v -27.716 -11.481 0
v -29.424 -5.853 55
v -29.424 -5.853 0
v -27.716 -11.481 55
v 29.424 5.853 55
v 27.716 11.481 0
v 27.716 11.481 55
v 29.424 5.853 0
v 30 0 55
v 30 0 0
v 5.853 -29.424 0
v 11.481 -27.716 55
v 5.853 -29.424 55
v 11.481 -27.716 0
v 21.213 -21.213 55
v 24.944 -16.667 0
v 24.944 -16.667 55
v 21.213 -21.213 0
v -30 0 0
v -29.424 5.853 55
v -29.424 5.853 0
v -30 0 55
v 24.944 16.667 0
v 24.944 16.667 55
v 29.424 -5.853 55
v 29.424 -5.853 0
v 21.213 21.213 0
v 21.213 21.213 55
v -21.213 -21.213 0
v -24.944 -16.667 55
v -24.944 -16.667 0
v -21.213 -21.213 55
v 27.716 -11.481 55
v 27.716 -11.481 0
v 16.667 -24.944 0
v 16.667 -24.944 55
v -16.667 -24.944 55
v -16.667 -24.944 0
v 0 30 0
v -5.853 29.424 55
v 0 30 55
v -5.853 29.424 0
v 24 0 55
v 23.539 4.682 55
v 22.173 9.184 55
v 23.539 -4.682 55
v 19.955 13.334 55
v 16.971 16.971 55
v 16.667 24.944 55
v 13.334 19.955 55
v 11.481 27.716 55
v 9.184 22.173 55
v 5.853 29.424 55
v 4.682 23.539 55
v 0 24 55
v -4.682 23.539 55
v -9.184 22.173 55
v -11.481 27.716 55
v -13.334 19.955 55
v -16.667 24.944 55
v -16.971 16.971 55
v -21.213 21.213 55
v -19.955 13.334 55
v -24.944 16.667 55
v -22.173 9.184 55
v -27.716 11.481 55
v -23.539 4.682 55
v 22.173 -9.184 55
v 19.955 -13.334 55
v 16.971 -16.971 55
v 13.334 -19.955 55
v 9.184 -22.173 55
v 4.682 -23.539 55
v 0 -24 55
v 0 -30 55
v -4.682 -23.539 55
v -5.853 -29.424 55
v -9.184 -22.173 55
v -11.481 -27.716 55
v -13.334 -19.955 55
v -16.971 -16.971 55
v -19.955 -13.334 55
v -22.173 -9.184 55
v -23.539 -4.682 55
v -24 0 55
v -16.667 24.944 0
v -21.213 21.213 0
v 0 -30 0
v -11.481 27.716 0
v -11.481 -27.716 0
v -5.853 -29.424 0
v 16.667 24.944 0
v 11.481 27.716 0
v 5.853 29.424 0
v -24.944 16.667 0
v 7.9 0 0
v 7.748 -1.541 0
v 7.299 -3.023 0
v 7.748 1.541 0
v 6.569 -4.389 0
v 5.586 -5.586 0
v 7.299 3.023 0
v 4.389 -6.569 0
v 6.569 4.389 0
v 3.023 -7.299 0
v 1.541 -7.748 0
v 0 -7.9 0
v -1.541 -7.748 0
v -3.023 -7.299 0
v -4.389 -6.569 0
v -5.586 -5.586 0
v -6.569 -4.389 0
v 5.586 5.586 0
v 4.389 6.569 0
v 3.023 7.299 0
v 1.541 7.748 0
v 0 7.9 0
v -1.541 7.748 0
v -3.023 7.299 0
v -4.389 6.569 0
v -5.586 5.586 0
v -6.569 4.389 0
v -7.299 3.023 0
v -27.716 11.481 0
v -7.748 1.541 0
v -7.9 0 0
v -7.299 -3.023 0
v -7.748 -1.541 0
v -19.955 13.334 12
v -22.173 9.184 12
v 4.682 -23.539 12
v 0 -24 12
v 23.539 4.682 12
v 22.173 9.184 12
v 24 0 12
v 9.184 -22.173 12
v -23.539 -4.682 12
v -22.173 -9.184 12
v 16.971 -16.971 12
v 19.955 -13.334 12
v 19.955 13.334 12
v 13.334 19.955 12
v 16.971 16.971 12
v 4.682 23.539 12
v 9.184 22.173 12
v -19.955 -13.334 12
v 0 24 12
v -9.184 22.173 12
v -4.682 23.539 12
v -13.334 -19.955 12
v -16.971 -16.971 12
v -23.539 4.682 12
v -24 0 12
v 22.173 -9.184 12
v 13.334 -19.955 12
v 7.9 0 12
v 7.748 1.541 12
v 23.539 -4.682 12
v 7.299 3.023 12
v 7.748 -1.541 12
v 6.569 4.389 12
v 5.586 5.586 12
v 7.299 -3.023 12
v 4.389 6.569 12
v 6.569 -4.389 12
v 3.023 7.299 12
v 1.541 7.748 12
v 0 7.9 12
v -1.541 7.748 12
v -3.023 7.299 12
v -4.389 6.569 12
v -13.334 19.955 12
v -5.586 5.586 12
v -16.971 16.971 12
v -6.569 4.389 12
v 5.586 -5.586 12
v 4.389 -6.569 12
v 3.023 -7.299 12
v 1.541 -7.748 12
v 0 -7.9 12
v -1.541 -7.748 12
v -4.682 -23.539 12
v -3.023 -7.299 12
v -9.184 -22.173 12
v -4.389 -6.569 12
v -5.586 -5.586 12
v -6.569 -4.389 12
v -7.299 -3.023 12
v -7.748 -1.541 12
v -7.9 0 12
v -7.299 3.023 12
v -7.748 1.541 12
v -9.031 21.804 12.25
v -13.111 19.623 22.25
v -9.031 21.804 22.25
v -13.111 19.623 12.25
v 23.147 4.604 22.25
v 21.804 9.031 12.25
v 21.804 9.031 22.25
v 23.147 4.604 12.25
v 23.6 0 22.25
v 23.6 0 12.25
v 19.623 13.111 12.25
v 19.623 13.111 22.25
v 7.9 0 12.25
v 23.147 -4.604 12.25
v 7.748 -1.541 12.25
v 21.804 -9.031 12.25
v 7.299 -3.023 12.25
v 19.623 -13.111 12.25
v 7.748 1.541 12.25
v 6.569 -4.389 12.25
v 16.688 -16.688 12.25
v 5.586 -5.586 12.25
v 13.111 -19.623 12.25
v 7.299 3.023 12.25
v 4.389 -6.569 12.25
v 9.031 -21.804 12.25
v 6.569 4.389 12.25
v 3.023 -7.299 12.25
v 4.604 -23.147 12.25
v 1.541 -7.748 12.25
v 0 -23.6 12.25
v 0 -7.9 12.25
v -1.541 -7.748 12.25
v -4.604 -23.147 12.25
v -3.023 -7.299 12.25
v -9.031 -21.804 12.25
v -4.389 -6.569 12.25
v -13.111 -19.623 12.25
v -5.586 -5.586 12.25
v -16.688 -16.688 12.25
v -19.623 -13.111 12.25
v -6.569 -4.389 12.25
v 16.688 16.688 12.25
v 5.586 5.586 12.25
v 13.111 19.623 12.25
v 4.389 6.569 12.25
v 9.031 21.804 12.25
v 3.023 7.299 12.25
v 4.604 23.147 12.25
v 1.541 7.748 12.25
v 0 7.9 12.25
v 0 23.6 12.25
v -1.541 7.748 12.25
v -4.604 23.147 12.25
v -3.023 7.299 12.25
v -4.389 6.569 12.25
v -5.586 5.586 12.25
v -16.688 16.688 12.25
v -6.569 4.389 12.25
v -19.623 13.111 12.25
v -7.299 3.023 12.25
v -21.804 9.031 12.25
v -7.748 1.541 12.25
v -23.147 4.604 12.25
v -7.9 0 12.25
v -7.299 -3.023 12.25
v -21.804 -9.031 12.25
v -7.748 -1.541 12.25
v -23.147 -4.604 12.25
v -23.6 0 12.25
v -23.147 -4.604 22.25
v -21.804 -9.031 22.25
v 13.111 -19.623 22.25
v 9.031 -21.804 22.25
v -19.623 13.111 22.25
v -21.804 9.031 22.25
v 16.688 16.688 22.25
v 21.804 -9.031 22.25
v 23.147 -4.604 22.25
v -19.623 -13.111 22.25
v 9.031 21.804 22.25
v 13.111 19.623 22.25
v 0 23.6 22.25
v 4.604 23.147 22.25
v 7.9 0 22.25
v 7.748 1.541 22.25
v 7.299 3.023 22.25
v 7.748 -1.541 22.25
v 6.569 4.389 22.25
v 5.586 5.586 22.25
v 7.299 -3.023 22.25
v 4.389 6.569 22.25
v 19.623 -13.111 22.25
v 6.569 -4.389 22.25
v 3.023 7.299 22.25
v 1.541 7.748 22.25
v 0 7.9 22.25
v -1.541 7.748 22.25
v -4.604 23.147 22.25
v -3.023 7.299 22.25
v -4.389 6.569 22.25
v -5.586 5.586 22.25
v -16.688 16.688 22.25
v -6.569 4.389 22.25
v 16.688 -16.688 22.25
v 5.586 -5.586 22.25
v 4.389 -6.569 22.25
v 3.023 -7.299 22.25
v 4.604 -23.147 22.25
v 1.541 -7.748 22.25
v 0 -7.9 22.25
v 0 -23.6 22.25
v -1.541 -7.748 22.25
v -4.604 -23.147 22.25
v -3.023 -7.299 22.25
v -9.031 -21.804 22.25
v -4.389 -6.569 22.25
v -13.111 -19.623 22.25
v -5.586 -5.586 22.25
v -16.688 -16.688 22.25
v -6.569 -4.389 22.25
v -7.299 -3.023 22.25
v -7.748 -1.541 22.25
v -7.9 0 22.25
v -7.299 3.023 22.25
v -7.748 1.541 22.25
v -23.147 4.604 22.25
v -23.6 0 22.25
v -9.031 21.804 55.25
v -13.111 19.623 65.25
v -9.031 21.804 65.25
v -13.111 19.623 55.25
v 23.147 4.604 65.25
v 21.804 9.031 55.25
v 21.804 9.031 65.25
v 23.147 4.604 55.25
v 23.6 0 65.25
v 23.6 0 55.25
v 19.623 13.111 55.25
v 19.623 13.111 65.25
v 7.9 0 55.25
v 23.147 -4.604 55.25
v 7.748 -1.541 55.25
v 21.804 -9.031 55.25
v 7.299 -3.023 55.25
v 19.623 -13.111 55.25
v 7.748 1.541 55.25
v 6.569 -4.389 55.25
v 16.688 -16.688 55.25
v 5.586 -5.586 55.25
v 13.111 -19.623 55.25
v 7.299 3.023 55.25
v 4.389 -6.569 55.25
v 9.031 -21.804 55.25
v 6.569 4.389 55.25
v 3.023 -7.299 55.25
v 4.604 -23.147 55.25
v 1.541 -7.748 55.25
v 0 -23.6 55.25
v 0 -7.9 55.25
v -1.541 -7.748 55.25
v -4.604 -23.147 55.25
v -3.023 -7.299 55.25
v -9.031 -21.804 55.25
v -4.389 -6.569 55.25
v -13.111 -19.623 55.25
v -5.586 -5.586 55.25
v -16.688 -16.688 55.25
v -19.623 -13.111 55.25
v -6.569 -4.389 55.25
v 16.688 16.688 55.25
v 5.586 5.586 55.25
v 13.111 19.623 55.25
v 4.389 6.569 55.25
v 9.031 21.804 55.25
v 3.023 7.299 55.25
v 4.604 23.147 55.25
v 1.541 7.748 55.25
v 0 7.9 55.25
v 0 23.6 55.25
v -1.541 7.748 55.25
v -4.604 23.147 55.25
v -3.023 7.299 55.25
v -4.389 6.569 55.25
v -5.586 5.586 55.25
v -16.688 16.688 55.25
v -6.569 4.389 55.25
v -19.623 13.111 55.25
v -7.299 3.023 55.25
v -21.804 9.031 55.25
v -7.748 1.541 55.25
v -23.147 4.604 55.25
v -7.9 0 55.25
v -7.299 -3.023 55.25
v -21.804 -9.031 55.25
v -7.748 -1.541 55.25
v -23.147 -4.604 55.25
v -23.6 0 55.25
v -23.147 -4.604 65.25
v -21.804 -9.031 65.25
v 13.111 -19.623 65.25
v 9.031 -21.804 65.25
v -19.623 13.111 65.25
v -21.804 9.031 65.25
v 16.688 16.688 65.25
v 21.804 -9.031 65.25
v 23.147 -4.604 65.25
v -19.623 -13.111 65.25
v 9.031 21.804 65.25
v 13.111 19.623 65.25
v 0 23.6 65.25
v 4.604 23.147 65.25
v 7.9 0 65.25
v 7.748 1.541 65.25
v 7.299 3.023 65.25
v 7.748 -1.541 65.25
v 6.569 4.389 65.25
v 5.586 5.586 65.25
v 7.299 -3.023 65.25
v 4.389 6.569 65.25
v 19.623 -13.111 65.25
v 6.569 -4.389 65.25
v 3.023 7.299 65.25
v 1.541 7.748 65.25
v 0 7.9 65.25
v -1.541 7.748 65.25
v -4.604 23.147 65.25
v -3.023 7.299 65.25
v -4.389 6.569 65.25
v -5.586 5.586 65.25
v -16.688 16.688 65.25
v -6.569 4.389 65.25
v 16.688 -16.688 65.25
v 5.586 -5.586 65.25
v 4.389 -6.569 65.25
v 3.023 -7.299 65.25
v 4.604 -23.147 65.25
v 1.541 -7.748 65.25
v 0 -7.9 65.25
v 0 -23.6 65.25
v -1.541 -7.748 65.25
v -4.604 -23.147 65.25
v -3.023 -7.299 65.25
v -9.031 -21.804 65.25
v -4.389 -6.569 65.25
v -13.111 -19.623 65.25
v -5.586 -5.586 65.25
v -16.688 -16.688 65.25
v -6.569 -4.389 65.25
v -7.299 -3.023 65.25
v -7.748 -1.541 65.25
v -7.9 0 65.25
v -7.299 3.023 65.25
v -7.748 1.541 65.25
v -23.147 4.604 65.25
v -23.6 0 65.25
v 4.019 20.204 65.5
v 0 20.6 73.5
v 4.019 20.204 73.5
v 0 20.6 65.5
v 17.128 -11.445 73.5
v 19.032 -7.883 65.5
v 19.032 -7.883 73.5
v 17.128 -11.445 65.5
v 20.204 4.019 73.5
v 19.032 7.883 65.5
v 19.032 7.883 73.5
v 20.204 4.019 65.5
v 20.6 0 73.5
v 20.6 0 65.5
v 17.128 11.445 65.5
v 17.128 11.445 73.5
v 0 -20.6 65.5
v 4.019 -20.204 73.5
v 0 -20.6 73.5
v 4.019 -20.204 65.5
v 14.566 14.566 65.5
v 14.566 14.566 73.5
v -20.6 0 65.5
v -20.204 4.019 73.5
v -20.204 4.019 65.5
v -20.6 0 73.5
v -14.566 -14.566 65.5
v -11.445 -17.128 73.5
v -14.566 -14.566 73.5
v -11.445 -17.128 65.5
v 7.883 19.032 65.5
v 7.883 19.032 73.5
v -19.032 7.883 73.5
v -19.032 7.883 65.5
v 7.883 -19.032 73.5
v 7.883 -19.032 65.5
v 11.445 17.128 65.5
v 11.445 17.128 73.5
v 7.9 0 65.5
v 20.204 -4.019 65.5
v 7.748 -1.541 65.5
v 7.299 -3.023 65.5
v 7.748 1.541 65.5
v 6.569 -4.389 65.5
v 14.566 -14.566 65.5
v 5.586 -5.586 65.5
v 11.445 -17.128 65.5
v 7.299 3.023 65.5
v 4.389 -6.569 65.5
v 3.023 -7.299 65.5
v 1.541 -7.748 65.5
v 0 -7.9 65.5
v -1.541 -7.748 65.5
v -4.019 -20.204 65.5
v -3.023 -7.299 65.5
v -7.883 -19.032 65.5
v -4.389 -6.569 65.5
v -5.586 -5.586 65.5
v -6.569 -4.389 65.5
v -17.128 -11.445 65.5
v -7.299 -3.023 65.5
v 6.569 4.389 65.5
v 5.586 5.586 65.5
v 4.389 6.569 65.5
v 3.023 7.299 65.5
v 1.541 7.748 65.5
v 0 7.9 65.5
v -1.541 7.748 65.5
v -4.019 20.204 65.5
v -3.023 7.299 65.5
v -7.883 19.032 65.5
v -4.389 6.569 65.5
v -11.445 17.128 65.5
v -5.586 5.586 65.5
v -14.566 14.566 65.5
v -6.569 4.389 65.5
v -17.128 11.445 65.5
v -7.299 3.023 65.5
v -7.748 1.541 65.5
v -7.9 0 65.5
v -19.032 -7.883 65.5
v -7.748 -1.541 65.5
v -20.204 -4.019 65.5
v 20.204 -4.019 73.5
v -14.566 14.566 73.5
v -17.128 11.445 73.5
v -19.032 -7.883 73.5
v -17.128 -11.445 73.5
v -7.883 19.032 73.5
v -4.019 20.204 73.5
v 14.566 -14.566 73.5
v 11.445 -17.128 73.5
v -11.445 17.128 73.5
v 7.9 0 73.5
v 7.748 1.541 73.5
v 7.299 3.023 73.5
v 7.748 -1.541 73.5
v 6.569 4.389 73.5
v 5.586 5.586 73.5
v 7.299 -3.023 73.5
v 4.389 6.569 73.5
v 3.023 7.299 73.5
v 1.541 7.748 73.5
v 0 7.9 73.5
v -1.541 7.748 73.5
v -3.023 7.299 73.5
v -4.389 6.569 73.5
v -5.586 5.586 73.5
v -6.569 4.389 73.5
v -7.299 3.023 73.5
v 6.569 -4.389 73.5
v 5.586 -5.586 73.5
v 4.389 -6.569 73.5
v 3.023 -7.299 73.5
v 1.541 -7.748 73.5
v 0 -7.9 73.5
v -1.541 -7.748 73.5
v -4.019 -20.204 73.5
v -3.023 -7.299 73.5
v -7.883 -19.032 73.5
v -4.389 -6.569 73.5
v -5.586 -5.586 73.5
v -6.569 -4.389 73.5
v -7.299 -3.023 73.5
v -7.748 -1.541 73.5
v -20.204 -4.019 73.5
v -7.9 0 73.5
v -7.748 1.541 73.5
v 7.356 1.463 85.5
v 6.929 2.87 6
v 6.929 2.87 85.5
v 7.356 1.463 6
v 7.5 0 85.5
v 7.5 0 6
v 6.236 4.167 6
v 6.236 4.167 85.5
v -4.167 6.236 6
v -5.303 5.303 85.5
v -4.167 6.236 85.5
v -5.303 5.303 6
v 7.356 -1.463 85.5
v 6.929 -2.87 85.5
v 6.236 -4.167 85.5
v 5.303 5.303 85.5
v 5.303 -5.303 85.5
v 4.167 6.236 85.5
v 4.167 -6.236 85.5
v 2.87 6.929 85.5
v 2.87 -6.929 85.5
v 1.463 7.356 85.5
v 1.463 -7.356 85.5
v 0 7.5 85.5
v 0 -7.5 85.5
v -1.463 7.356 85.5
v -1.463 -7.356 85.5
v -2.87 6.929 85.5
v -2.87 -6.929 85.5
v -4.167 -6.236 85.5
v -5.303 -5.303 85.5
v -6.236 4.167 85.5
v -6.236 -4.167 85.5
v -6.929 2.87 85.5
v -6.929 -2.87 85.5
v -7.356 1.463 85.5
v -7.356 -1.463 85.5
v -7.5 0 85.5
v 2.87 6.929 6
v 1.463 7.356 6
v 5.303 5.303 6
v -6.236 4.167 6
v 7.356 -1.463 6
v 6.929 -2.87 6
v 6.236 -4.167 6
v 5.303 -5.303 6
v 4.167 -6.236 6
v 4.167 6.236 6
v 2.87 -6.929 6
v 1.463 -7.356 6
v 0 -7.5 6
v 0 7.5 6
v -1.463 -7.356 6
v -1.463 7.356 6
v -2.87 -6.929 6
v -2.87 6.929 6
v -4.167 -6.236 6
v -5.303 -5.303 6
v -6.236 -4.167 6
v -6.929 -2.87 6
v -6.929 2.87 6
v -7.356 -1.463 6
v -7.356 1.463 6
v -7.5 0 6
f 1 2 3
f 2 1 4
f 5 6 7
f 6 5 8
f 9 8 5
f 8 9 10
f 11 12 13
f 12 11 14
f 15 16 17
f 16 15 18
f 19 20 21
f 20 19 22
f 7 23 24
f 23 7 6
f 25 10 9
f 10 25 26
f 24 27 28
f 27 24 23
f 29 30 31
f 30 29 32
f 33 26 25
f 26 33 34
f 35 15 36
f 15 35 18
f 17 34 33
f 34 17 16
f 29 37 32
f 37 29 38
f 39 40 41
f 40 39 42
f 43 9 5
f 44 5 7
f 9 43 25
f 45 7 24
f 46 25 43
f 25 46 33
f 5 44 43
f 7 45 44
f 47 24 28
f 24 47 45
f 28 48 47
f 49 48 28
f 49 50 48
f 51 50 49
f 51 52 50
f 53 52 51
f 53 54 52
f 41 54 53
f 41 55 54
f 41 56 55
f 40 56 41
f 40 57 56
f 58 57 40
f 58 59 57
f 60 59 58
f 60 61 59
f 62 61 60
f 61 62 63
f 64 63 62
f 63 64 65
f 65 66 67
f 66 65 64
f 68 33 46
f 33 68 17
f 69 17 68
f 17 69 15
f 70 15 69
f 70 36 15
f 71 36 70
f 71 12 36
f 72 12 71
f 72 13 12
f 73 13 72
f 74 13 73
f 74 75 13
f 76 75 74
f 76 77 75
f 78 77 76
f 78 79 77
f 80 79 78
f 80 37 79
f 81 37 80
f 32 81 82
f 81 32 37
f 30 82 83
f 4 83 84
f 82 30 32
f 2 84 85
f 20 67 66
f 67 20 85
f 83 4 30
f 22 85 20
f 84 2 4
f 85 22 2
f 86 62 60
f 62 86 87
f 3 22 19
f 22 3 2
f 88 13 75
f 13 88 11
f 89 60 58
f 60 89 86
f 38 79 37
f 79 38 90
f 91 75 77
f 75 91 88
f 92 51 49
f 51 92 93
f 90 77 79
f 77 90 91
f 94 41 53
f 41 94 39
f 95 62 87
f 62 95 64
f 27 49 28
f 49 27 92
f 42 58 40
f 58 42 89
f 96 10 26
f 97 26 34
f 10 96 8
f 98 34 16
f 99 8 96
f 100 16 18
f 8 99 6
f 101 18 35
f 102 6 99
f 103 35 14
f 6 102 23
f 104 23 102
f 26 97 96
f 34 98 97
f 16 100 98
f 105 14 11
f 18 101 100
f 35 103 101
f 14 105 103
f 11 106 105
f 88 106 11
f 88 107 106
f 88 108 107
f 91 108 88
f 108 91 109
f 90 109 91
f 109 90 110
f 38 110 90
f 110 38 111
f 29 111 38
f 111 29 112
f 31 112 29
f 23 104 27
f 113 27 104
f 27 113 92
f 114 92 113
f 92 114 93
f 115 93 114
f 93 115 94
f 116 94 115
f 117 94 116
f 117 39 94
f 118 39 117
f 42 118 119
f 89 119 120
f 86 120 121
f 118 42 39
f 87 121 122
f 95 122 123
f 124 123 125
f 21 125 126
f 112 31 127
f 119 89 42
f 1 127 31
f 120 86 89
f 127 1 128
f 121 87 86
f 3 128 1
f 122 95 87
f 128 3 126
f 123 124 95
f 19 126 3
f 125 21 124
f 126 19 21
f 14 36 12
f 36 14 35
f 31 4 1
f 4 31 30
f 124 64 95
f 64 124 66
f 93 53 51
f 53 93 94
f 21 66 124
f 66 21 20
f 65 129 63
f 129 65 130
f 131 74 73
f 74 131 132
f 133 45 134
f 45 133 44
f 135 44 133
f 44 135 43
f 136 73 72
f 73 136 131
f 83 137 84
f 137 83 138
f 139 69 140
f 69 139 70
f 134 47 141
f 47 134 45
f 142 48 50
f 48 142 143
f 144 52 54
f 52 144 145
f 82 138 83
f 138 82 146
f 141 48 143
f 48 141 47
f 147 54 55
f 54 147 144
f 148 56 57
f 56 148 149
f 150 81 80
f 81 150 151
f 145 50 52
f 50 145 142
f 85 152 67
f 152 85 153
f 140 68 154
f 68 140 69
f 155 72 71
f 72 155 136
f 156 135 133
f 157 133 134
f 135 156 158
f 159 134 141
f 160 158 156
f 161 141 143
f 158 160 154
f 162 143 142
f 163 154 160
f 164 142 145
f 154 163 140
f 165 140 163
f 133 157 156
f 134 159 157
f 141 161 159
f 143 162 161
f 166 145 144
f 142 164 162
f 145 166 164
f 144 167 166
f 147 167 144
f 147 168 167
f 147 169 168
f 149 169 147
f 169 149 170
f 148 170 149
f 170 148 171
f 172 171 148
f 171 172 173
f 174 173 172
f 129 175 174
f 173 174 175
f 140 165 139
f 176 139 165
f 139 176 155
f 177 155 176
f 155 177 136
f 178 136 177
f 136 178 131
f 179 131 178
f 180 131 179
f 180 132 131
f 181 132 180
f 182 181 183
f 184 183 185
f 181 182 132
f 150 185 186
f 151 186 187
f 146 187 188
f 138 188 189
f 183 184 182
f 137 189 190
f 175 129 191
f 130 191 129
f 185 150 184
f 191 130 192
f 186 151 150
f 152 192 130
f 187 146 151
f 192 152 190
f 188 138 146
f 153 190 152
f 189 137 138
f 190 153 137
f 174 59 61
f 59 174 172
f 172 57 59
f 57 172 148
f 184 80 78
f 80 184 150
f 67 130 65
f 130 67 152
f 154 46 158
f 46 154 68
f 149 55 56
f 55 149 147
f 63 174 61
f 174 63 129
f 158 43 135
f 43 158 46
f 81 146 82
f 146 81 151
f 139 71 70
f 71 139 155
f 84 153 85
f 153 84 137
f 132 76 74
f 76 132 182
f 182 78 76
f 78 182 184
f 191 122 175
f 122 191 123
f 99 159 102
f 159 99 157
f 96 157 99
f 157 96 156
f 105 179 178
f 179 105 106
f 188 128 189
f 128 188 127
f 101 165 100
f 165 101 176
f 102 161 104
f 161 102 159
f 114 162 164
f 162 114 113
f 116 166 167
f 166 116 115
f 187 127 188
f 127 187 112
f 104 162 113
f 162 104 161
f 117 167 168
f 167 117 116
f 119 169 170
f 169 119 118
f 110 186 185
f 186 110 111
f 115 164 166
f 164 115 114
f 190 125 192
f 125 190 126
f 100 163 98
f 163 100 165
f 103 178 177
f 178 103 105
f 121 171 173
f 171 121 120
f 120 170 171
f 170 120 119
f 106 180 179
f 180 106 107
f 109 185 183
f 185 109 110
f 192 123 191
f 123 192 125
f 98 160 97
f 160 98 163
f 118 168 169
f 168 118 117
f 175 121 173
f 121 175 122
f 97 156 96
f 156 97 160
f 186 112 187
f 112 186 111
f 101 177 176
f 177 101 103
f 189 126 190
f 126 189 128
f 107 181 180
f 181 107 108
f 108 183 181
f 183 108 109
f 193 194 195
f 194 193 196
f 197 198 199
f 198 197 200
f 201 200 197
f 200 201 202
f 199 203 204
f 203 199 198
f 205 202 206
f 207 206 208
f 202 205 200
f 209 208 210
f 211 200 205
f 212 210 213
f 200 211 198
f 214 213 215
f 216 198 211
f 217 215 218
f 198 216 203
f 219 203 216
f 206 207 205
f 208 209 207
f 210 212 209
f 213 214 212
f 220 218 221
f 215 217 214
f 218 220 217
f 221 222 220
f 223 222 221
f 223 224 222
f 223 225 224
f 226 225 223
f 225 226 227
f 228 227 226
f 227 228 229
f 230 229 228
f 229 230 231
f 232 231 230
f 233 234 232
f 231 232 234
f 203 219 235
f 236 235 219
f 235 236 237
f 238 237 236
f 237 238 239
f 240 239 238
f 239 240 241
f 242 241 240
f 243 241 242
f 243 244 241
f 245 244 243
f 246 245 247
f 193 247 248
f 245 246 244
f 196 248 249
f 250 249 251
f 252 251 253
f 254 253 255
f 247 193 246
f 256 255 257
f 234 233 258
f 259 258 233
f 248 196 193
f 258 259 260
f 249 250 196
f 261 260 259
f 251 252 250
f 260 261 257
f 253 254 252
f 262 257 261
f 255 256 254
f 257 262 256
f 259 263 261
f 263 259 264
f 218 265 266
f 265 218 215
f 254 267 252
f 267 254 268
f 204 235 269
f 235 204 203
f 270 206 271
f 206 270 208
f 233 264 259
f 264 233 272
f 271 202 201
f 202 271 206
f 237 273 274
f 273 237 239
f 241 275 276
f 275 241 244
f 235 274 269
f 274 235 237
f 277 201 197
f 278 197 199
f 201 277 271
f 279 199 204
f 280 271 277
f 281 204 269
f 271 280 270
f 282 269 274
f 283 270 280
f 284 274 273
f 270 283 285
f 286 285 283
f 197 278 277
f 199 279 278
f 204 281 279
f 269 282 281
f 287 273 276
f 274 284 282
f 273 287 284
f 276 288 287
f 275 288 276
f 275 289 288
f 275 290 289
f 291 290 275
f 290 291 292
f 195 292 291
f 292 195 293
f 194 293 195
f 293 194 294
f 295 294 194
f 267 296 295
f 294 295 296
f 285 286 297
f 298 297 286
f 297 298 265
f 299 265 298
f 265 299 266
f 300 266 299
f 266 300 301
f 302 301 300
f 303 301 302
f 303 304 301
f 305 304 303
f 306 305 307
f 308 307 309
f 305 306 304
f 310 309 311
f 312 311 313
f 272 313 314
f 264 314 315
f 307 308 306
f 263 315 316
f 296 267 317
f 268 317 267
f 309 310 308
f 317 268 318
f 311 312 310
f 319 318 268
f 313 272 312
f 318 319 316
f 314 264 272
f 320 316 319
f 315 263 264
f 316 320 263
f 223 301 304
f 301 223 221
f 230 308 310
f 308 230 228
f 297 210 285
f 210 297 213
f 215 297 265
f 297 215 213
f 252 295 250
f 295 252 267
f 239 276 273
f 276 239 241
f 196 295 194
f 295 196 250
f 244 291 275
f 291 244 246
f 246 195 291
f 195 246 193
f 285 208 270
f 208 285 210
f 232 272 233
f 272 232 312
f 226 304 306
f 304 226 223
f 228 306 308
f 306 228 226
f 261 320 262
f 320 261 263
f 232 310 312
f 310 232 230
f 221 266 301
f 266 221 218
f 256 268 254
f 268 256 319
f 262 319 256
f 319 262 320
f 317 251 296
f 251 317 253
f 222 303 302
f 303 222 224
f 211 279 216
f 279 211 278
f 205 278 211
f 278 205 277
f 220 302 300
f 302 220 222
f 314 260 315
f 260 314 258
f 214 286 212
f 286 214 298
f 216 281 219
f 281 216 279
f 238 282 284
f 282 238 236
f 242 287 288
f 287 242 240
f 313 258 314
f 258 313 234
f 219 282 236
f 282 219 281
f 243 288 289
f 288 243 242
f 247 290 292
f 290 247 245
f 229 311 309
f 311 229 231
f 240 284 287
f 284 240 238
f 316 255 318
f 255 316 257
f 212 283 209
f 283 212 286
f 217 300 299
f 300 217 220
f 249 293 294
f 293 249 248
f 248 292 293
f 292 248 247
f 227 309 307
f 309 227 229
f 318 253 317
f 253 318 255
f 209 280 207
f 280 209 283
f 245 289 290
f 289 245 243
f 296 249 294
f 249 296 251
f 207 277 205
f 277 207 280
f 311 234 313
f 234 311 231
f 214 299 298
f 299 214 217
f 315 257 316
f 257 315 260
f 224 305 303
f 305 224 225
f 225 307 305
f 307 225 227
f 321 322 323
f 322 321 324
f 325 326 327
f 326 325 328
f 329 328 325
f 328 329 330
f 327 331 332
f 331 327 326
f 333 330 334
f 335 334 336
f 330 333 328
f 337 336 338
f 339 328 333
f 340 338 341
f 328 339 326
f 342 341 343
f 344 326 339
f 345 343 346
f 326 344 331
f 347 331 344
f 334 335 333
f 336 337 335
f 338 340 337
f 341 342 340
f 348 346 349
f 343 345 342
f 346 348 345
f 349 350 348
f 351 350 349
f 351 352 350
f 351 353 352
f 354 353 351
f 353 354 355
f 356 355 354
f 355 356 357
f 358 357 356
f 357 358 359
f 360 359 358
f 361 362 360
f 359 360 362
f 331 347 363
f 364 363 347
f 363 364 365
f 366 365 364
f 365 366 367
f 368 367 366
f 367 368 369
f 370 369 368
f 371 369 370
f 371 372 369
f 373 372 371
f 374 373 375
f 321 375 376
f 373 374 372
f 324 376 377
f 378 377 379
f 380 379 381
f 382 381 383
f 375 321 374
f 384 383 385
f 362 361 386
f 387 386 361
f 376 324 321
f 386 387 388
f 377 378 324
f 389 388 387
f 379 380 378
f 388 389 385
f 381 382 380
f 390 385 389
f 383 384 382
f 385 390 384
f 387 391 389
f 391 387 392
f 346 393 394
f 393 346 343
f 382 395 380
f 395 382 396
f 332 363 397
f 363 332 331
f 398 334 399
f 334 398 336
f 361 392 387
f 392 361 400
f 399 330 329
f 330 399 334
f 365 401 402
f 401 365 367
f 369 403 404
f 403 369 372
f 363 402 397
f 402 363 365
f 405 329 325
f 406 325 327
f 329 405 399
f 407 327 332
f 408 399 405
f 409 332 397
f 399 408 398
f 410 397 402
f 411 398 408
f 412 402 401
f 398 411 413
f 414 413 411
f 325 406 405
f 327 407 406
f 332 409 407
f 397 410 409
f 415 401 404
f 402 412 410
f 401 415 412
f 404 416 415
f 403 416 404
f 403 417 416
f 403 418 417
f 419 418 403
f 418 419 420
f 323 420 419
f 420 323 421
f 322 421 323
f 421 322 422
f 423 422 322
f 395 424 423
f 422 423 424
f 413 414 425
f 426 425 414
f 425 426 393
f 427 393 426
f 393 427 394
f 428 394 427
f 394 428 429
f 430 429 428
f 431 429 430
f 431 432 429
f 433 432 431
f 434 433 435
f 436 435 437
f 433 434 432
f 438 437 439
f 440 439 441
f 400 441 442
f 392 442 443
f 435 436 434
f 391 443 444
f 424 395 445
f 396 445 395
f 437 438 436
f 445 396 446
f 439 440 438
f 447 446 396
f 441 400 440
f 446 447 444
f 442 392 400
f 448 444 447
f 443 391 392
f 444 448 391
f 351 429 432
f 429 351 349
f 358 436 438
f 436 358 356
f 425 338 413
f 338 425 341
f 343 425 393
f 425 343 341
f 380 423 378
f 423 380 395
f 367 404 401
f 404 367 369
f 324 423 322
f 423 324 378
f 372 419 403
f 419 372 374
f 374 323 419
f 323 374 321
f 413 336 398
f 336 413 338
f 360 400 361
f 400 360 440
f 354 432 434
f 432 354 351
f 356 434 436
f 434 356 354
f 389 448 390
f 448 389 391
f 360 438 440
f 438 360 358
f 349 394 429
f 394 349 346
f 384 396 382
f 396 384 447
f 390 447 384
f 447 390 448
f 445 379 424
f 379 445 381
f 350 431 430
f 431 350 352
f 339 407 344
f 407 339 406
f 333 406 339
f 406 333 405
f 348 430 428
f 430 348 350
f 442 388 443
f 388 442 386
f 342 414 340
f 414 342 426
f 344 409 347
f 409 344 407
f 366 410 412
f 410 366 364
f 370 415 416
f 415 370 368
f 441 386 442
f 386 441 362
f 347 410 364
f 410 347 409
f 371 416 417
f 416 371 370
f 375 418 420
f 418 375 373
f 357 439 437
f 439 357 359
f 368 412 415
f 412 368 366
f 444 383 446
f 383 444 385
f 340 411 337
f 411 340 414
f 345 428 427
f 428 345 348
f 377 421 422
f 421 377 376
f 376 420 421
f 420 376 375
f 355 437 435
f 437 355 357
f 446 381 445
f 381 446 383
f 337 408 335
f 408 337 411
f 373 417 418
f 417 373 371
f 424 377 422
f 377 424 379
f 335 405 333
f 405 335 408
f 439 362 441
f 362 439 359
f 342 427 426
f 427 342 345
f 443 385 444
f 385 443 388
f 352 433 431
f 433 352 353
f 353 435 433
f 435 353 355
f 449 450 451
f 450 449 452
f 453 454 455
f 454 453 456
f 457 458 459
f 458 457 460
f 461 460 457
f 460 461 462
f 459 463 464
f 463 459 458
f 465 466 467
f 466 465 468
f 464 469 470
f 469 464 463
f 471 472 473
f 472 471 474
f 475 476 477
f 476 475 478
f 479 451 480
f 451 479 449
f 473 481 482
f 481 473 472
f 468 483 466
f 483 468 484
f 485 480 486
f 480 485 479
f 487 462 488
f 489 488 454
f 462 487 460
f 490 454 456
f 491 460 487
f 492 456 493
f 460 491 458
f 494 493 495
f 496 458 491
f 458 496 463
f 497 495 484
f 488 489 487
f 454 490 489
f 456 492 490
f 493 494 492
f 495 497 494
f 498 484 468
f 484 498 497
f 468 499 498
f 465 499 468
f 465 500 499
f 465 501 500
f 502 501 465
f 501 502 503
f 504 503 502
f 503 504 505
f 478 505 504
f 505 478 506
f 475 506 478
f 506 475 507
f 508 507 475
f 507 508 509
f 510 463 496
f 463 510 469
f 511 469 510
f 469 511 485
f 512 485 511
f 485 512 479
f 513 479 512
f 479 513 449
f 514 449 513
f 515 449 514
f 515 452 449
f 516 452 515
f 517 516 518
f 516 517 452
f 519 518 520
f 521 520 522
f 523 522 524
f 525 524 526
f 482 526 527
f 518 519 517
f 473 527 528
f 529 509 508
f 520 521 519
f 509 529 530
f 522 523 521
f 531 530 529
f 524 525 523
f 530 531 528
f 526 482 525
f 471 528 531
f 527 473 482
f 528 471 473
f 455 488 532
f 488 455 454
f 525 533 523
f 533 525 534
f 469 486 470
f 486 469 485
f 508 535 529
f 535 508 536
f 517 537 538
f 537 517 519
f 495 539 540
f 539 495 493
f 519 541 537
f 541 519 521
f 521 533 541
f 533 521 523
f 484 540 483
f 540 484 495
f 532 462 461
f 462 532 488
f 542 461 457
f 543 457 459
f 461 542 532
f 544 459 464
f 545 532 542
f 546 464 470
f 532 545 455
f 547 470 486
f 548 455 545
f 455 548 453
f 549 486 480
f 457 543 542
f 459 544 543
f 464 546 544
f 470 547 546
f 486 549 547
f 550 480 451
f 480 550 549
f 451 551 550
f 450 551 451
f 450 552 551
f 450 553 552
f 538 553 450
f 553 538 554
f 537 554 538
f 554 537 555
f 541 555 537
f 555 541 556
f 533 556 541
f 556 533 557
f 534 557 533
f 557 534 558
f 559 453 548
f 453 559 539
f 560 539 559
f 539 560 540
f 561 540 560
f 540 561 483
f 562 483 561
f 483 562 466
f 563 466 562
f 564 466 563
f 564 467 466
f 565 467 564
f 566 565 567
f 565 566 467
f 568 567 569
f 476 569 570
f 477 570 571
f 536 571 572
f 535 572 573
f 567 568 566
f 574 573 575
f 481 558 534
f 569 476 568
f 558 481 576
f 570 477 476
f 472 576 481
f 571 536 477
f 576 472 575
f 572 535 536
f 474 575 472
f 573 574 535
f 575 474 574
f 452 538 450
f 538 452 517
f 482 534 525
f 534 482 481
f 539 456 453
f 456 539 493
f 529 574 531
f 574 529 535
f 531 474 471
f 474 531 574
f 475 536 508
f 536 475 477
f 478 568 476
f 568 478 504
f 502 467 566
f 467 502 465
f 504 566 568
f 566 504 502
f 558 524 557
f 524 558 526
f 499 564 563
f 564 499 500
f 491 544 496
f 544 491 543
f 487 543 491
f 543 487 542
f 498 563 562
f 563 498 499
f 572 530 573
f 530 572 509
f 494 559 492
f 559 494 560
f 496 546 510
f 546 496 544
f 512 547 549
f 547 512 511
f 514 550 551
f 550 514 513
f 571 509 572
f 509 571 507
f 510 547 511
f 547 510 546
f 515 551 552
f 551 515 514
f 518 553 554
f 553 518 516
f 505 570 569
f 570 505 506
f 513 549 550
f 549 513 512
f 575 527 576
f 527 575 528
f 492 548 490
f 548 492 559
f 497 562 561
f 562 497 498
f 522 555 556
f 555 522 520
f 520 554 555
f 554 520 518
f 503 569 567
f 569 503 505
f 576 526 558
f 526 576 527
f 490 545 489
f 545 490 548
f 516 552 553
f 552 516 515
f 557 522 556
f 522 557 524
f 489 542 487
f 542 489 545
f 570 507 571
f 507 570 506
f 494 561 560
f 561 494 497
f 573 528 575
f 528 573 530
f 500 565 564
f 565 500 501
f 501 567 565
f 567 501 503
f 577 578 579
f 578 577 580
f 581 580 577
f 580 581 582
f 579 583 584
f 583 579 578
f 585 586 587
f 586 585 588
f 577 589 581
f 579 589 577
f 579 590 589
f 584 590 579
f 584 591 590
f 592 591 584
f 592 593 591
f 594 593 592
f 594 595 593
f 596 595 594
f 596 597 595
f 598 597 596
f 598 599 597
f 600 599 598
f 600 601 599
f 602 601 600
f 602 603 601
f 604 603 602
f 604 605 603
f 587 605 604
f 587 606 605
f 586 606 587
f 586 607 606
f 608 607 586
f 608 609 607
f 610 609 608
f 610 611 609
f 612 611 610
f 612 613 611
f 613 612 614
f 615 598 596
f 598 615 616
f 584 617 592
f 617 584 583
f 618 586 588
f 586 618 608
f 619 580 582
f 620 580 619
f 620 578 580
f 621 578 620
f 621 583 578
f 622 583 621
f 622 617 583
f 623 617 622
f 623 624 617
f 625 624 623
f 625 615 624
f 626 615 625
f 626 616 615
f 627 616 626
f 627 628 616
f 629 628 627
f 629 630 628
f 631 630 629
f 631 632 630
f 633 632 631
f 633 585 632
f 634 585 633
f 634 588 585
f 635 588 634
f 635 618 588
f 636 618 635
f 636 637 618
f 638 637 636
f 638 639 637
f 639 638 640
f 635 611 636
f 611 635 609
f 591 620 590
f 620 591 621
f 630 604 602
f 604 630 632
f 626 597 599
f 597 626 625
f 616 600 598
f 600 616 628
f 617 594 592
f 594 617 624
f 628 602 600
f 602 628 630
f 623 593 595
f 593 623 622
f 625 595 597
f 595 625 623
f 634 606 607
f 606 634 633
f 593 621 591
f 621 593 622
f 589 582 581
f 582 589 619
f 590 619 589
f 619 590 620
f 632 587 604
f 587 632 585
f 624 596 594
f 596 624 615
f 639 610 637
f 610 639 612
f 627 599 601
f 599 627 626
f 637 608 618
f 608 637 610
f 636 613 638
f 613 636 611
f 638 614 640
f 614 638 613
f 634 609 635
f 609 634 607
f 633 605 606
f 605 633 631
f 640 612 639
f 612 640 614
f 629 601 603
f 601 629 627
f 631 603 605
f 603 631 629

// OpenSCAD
$fn = 32;

// ------------------------------------------------------------------------
// Bearing housing: housing d60, two bearings and a shaft
// Every part is its own module, assembly() places them once.
// ------------------------------------------------------------------------

// --- part 1 ---
module housing() {
  difference() {
    cylinder(h = 55, d = 60);
    translate([0, 0, 12]) cylinder(h = 44, d = 48);
    translate([0, 0, -1]) cylinder(h = 14, d = 15.8);
  }
}

// --- part 2 ---
module bearing_lower() {
  difference() {
      translate([0, 0, 0]) cylinder(h = 10, d = 47.2);
      translate([0, 0, -1]) cylinder(h = 12, d = 15.8);
    }
}

// --- part 3 ---
module bearing_upper() {
  difference() {
      translate([0, 0, 0]) cylinder(h = 10, d = 47.2);
      translate([0, 0, -1]) cylinder(h = 12, d = 15.8);
    }
}

// --- part 4 ---
module spacer() {
  difference() {
      translate([0, 0, 0]) cylinder(h = 8, d = 41.2);
      translate([0, 0, -1]) cylinder(h = 10, d = 15.8);
    }
}

// --- part 5 ---
module shaft() {
  translate([0, 0, -39.75]) cylinder(h = 79.5, d = 15);
}

// --- assembly ---
module assembly() {
  translate([0, 0, 0]) rotate([0, 0, 0]) housing();
  translate([0, 0, 12.25]) rotate([0, 0, 0]) bearing_lower();
  translate([0, 0, 55.25]) rotate([0, 0, 0]) bearing_upper();
  translate([0, 0, 65.5]) rotate([0, 0, 0]) spacer();
  translate([0, 0, 45.75]) rotate([0, 0, 0]) shaft();
}

assembly();
